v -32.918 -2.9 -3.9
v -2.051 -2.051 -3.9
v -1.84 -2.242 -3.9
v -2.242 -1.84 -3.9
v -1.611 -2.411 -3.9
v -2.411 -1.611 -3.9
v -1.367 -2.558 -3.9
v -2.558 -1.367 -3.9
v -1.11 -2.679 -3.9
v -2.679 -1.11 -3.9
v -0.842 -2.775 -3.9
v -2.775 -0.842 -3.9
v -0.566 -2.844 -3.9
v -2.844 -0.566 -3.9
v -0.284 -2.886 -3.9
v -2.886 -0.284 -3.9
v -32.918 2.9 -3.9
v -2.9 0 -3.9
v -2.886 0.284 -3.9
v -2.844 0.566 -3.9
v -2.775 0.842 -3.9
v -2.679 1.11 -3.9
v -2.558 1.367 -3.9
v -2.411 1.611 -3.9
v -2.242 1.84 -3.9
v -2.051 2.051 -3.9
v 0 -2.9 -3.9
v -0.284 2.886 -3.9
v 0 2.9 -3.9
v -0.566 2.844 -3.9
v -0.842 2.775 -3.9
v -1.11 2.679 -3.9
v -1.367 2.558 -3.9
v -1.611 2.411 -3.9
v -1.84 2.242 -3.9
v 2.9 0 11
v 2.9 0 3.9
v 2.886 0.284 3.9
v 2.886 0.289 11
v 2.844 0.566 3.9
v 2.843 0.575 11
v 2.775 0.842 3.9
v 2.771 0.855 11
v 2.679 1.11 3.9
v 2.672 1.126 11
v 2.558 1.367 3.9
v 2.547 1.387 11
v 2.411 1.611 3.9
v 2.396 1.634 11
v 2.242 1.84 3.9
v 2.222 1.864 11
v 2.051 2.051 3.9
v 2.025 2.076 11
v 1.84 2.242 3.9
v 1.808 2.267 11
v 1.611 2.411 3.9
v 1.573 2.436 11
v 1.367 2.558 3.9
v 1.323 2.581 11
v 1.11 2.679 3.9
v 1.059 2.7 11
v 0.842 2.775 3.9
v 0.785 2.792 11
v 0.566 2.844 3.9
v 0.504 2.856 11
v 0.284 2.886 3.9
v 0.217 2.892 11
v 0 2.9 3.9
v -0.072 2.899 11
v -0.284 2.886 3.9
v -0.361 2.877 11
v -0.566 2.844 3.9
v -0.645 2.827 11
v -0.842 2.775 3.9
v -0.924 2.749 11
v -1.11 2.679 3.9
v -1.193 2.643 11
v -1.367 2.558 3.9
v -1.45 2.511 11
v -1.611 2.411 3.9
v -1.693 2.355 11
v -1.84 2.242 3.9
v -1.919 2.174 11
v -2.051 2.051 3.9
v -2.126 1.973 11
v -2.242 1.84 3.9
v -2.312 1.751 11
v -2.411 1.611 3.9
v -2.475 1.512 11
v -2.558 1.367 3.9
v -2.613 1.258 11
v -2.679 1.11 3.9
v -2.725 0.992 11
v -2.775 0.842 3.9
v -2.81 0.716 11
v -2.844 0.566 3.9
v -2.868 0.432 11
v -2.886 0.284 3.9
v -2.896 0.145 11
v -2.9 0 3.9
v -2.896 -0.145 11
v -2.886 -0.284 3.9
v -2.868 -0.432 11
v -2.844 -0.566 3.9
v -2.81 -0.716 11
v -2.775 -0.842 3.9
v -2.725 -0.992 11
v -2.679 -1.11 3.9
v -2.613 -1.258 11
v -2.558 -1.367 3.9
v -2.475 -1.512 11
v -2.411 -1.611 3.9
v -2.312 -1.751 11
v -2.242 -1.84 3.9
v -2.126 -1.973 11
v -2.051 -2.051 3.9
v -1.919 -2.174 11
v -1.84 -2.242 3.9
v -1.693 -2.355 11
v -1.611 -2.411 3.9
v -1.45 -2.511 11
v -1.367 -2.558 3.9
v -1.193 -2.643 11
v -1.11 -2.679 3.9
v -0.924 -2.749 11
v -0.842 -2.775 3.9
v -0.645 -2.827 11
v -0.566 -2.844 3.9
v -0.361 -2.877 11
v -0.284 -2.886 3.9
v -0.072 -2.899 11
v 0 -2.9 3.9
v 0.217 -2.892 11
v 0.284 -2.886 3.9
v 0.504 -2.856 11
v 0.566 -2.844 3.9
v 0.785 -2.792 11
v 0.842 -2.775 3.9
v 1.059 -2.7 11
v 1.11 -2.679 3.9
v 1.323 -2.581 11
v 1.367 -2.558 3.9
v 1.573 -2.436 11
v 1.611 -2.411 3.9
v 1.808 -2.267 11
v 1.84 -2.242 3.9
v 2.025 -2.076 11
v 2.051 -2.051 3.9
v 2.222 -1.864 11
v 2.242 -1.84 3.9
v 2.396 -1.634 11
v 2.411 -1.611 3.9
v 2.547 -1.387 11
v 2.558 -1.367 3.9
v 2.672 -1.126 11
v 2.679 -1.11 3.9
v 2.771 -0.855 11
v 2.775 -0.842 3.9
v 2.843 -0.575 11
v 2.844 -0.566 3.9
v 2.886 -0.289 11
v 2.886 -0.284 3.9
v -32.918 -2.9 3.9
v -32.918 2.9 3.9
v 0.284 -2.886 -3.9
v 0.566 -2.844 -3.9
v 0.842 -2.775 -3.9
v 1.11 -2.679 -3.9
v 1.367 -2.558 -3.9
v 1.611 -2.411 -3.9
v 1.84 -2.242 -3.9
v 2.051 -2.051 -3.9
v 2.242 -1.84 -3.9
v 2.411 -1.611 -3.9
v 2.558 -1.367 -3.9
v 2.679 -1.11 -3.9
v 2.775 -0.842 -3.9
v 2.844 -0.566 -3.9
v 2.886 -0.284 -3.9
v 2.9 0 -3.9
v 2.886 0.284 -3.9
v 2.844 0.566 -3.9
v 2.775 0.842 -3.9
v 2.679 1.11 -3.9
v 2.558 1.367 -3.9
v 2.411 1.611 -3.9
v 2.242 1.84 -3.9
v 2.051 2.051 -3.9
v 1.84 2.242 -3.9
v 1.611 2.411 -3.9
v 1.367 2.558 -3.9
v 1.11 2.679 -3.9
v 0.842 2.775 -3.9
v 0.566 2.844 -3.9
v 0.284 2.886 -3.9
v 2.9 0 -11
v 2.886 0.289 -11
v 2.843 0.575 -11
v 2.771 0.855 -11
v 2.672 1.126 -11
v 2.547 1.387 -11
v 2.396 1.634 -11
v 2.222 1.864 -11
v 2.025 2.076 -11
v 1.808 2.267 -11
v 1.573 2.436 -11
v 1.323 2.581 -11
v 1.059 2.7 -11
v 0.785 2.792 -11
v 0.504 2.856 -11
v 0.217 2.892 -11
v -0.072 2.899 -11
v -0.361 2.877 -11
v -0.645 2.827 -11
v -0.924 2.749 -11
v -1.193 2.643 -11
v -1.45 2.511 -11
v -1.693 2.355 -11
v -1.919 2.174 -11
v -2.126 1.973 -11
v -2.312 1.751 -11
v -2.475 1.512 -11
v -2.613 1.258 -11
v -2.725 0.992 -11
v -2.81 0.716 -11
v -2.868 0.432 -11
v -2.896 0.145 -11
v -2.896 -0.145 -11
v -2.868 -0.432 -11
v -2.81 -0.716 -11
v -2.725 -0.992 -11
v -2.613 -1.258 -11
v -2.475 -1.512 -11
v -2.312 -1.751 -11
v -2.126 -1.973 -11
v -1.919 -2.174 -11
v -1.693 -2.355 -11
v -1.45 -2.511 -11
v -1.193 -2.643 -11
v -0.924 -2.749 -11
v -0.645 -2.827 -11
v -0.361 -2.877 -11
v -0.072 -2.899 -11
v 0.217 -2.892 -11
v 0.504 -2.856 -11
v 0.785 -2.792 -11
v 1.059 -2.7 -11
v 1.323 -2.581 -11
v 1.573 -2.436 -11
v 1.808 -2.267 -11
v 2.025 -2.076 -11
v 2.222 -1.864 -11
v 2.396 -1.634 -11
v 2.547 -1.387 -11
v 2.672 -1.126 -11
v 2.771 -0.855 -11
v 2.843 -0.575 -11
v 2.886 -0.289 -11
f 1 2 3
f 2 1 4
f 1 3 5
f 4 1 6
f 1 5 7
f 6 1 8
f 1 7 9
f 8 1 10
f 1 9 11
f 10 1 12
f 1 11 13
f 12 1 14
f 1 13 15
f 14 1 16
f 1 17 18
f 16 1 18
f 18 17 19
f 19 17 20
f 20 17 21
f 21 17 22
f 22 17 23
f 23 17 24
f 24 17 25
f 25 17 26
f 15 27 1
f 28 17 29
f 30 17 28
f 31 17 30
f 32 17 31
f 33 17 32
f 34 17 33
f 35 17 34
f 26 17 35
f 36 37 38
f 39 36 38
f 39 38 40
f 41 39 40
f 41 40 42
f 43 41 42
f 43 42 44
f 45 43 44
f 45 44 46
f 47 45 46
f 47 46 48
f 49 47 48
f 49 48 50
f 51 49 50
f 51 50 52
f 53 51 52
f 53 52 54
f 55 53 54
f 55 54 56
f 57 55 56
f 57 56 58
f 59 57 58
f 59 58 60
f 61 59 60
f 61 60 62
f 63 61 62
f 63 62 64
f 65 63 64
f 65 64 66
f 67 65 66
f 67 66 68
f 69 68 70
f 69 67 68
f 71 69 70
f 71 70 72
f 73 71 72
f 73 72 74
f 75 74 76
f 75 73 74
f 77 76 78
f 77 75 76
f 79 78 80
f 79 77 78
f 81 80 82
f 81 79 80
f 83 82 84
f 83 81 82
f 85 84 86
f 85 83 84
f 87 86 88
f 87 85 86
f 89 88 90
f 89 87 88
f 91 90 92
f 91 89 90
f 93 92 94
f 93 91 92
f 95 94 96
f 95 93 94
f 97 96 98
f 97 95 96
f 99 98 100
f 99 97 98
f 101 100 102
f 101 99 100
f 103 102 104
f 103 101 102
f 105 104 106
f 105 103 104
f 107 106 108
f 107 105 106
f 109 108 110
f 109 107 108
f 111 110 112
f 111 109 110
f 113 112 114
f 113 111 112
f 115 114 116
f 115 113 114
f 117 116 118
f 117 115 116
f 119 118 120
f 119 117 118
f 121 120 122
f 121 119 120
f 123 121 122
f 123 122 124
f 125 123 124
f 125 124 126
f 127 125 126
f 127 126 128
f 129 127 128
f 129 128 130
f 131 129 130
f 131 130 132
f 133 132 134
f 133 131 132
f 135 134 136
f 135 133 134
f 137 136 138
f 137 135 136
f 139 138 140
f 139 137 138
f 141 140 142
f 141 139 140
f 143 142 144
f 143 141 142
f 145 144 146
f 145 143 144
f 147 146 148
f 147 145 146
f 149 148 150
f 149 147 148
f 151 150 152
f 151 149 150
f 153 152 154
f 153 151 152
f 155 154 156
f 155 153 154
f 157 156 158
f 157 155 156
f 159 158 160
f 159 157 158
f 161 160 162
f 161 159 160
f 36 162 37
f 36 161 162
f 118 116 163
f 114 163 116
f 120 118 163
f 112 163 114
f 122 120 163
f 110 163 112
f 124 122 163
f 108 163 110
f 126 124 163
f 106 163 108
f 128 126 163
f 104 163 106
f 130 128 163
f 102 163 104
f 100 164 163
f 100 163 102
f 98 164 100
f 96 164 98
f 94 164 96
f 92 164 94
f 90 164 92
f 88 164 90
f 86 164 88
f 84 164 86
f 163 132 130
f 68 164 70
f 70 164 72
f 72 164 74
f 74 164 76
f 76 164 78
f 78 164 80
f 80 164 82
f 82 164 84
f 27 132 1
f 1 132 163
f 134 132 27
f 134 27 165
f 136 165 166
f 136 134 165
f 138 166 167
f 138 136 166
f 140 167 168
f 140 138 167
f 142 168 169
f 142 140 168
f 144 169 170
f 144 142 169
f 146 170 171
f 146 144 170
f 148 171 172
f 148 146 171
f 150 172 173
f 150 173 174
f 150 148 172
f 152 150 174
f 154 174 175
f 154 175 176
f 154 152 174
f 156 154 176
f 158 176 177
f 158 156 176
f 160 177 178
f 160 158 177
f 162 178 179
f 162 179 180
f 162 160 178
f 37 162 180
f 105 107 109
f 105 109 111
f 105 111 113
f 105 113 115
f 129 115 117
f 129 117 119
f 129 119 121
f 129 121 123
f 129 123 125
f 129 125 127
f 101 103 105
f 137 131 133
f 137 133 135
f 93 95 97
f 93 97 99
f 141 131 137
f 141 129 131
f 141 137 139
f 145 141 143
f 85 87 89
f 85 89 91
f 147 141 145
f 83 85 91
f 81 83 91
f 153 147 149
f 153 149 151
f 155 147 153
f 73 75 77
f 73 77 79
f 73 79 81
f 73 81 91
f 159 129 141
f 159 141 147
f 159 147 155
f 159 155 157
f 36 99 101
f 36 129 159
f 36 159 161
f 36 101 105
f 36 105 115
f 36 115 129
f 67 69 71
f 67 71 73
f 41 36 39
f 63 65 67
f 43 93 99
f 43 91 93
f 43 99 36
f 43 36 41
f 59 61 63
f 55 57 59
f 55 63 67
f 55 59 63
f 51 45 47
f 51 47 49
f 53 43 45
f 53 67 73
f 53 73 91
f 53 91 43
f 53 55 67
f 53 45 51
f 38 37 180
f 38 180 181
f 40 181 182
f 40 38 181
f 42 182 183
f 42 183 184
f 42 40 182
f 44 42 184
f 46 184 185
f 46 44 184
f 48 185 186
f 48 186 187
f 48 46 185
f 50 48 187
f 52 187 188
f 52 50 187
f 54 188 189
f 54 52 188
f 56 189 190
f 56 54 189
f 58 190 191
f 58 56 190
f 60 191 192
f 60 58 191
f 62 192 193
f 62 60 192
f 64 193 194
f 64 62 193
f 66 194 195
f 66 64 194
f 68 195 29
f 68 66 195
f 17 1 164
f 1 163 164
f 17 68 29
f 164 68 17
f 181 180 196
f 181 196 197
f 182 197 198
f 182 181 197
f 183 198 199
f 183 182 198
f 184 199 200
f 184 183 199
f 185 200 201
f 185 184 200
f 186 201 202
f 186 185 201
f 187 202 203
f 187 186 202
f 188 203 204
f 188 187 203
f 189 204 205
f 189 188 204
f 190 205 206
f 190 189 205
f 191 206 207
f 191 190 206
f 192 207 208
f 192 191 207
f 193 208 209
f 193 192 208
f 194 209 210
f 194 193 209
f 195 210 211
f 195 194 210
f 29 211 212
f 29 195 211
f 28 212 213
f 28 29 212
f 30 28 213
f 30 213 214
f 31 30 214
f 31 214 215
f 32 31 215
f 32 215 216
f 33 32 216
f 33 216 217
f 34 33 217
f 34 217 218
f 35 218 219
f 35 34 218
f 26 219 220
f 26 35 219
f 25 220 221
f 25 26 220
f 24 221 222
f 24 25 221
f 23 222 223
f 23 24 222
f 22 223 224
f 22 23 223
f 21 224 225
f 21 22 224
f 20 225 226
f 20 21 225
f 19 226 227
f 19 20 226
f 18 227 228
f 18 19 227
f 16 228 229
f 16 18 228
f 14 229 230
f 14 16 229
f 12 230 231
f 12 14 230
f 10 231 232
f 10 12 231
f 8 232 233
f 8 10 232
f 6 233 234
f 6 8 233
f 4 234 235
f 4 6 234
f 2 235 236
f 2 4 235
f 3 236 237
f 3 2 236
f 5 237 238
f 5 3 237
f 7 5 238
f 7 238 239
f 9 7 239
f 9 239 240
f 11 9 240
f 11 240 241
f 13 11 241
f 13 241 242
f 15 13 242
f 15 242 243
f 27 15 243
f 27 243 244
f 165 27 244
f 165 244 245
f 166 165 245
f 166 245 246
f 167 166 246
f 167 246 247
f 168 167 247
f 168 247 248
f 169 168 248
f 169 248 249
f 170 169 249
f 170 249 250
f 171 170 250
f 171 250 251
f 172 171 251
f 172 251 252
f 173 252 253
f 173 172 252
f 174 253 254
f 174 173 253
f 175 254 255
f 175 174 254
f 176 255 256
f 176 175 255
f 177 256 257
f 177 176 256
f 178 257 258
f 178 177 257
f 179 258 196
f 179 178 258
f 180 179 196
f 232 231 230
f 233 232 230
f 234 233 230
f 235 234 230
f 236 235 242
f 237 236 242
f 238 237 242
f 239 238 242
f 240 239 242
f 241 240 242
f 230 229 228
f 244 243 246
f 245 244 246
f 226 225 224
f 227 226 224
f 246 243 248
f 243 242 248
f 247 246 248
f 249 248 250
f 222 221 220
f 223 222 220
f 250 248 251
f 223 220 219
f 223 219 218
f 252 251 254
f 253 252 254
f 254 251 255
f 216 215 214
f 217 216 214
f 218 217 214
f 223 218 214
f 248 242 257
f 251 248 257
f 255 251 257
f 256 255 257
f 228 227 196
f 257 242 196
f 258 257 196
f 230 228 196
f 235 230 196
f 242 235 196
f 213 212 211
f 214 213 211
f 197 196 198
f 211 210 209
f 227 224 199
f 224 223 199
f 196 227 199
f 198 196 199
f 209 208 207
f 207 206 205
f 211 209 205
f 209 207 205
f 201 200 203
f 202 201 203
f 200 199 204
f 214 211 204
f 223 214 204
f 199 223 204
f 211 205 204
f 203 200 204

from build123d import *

# Parameters (mm, degrees)
PAD_DEPTH    = 3.9
SKETCH001_R  = 2.9
PAD001_DEPTH = 11


with BuildPart() as part:
    # Sketch → Pad (new body, symmetric)
    with BuildSketch(Plane.XY):
        with BuildLine():
            ThreePointArc((-1.2e-05, -2.9), (2.9, 0), (-1.2e-05, 2.9))
            Line((-1.2e-05, 2.9), (-32.917675, 2.9))
            Line((-32.917675, -2.9), (-32.917675, 2.9))
            Line((-1.2e-05, -2.9), (-32.917675, -2.9))
        make_face()
    extrude(amount=PAD_DEPTH, both=True)

    # Sketch001 → Pad001 (join, symmetric)
    with BuildSketch(Plane.XY):
        Circle(SKETCH001_R)
    extrude(amount=PAD001_DEPTH, both=True)


solid = part.part
